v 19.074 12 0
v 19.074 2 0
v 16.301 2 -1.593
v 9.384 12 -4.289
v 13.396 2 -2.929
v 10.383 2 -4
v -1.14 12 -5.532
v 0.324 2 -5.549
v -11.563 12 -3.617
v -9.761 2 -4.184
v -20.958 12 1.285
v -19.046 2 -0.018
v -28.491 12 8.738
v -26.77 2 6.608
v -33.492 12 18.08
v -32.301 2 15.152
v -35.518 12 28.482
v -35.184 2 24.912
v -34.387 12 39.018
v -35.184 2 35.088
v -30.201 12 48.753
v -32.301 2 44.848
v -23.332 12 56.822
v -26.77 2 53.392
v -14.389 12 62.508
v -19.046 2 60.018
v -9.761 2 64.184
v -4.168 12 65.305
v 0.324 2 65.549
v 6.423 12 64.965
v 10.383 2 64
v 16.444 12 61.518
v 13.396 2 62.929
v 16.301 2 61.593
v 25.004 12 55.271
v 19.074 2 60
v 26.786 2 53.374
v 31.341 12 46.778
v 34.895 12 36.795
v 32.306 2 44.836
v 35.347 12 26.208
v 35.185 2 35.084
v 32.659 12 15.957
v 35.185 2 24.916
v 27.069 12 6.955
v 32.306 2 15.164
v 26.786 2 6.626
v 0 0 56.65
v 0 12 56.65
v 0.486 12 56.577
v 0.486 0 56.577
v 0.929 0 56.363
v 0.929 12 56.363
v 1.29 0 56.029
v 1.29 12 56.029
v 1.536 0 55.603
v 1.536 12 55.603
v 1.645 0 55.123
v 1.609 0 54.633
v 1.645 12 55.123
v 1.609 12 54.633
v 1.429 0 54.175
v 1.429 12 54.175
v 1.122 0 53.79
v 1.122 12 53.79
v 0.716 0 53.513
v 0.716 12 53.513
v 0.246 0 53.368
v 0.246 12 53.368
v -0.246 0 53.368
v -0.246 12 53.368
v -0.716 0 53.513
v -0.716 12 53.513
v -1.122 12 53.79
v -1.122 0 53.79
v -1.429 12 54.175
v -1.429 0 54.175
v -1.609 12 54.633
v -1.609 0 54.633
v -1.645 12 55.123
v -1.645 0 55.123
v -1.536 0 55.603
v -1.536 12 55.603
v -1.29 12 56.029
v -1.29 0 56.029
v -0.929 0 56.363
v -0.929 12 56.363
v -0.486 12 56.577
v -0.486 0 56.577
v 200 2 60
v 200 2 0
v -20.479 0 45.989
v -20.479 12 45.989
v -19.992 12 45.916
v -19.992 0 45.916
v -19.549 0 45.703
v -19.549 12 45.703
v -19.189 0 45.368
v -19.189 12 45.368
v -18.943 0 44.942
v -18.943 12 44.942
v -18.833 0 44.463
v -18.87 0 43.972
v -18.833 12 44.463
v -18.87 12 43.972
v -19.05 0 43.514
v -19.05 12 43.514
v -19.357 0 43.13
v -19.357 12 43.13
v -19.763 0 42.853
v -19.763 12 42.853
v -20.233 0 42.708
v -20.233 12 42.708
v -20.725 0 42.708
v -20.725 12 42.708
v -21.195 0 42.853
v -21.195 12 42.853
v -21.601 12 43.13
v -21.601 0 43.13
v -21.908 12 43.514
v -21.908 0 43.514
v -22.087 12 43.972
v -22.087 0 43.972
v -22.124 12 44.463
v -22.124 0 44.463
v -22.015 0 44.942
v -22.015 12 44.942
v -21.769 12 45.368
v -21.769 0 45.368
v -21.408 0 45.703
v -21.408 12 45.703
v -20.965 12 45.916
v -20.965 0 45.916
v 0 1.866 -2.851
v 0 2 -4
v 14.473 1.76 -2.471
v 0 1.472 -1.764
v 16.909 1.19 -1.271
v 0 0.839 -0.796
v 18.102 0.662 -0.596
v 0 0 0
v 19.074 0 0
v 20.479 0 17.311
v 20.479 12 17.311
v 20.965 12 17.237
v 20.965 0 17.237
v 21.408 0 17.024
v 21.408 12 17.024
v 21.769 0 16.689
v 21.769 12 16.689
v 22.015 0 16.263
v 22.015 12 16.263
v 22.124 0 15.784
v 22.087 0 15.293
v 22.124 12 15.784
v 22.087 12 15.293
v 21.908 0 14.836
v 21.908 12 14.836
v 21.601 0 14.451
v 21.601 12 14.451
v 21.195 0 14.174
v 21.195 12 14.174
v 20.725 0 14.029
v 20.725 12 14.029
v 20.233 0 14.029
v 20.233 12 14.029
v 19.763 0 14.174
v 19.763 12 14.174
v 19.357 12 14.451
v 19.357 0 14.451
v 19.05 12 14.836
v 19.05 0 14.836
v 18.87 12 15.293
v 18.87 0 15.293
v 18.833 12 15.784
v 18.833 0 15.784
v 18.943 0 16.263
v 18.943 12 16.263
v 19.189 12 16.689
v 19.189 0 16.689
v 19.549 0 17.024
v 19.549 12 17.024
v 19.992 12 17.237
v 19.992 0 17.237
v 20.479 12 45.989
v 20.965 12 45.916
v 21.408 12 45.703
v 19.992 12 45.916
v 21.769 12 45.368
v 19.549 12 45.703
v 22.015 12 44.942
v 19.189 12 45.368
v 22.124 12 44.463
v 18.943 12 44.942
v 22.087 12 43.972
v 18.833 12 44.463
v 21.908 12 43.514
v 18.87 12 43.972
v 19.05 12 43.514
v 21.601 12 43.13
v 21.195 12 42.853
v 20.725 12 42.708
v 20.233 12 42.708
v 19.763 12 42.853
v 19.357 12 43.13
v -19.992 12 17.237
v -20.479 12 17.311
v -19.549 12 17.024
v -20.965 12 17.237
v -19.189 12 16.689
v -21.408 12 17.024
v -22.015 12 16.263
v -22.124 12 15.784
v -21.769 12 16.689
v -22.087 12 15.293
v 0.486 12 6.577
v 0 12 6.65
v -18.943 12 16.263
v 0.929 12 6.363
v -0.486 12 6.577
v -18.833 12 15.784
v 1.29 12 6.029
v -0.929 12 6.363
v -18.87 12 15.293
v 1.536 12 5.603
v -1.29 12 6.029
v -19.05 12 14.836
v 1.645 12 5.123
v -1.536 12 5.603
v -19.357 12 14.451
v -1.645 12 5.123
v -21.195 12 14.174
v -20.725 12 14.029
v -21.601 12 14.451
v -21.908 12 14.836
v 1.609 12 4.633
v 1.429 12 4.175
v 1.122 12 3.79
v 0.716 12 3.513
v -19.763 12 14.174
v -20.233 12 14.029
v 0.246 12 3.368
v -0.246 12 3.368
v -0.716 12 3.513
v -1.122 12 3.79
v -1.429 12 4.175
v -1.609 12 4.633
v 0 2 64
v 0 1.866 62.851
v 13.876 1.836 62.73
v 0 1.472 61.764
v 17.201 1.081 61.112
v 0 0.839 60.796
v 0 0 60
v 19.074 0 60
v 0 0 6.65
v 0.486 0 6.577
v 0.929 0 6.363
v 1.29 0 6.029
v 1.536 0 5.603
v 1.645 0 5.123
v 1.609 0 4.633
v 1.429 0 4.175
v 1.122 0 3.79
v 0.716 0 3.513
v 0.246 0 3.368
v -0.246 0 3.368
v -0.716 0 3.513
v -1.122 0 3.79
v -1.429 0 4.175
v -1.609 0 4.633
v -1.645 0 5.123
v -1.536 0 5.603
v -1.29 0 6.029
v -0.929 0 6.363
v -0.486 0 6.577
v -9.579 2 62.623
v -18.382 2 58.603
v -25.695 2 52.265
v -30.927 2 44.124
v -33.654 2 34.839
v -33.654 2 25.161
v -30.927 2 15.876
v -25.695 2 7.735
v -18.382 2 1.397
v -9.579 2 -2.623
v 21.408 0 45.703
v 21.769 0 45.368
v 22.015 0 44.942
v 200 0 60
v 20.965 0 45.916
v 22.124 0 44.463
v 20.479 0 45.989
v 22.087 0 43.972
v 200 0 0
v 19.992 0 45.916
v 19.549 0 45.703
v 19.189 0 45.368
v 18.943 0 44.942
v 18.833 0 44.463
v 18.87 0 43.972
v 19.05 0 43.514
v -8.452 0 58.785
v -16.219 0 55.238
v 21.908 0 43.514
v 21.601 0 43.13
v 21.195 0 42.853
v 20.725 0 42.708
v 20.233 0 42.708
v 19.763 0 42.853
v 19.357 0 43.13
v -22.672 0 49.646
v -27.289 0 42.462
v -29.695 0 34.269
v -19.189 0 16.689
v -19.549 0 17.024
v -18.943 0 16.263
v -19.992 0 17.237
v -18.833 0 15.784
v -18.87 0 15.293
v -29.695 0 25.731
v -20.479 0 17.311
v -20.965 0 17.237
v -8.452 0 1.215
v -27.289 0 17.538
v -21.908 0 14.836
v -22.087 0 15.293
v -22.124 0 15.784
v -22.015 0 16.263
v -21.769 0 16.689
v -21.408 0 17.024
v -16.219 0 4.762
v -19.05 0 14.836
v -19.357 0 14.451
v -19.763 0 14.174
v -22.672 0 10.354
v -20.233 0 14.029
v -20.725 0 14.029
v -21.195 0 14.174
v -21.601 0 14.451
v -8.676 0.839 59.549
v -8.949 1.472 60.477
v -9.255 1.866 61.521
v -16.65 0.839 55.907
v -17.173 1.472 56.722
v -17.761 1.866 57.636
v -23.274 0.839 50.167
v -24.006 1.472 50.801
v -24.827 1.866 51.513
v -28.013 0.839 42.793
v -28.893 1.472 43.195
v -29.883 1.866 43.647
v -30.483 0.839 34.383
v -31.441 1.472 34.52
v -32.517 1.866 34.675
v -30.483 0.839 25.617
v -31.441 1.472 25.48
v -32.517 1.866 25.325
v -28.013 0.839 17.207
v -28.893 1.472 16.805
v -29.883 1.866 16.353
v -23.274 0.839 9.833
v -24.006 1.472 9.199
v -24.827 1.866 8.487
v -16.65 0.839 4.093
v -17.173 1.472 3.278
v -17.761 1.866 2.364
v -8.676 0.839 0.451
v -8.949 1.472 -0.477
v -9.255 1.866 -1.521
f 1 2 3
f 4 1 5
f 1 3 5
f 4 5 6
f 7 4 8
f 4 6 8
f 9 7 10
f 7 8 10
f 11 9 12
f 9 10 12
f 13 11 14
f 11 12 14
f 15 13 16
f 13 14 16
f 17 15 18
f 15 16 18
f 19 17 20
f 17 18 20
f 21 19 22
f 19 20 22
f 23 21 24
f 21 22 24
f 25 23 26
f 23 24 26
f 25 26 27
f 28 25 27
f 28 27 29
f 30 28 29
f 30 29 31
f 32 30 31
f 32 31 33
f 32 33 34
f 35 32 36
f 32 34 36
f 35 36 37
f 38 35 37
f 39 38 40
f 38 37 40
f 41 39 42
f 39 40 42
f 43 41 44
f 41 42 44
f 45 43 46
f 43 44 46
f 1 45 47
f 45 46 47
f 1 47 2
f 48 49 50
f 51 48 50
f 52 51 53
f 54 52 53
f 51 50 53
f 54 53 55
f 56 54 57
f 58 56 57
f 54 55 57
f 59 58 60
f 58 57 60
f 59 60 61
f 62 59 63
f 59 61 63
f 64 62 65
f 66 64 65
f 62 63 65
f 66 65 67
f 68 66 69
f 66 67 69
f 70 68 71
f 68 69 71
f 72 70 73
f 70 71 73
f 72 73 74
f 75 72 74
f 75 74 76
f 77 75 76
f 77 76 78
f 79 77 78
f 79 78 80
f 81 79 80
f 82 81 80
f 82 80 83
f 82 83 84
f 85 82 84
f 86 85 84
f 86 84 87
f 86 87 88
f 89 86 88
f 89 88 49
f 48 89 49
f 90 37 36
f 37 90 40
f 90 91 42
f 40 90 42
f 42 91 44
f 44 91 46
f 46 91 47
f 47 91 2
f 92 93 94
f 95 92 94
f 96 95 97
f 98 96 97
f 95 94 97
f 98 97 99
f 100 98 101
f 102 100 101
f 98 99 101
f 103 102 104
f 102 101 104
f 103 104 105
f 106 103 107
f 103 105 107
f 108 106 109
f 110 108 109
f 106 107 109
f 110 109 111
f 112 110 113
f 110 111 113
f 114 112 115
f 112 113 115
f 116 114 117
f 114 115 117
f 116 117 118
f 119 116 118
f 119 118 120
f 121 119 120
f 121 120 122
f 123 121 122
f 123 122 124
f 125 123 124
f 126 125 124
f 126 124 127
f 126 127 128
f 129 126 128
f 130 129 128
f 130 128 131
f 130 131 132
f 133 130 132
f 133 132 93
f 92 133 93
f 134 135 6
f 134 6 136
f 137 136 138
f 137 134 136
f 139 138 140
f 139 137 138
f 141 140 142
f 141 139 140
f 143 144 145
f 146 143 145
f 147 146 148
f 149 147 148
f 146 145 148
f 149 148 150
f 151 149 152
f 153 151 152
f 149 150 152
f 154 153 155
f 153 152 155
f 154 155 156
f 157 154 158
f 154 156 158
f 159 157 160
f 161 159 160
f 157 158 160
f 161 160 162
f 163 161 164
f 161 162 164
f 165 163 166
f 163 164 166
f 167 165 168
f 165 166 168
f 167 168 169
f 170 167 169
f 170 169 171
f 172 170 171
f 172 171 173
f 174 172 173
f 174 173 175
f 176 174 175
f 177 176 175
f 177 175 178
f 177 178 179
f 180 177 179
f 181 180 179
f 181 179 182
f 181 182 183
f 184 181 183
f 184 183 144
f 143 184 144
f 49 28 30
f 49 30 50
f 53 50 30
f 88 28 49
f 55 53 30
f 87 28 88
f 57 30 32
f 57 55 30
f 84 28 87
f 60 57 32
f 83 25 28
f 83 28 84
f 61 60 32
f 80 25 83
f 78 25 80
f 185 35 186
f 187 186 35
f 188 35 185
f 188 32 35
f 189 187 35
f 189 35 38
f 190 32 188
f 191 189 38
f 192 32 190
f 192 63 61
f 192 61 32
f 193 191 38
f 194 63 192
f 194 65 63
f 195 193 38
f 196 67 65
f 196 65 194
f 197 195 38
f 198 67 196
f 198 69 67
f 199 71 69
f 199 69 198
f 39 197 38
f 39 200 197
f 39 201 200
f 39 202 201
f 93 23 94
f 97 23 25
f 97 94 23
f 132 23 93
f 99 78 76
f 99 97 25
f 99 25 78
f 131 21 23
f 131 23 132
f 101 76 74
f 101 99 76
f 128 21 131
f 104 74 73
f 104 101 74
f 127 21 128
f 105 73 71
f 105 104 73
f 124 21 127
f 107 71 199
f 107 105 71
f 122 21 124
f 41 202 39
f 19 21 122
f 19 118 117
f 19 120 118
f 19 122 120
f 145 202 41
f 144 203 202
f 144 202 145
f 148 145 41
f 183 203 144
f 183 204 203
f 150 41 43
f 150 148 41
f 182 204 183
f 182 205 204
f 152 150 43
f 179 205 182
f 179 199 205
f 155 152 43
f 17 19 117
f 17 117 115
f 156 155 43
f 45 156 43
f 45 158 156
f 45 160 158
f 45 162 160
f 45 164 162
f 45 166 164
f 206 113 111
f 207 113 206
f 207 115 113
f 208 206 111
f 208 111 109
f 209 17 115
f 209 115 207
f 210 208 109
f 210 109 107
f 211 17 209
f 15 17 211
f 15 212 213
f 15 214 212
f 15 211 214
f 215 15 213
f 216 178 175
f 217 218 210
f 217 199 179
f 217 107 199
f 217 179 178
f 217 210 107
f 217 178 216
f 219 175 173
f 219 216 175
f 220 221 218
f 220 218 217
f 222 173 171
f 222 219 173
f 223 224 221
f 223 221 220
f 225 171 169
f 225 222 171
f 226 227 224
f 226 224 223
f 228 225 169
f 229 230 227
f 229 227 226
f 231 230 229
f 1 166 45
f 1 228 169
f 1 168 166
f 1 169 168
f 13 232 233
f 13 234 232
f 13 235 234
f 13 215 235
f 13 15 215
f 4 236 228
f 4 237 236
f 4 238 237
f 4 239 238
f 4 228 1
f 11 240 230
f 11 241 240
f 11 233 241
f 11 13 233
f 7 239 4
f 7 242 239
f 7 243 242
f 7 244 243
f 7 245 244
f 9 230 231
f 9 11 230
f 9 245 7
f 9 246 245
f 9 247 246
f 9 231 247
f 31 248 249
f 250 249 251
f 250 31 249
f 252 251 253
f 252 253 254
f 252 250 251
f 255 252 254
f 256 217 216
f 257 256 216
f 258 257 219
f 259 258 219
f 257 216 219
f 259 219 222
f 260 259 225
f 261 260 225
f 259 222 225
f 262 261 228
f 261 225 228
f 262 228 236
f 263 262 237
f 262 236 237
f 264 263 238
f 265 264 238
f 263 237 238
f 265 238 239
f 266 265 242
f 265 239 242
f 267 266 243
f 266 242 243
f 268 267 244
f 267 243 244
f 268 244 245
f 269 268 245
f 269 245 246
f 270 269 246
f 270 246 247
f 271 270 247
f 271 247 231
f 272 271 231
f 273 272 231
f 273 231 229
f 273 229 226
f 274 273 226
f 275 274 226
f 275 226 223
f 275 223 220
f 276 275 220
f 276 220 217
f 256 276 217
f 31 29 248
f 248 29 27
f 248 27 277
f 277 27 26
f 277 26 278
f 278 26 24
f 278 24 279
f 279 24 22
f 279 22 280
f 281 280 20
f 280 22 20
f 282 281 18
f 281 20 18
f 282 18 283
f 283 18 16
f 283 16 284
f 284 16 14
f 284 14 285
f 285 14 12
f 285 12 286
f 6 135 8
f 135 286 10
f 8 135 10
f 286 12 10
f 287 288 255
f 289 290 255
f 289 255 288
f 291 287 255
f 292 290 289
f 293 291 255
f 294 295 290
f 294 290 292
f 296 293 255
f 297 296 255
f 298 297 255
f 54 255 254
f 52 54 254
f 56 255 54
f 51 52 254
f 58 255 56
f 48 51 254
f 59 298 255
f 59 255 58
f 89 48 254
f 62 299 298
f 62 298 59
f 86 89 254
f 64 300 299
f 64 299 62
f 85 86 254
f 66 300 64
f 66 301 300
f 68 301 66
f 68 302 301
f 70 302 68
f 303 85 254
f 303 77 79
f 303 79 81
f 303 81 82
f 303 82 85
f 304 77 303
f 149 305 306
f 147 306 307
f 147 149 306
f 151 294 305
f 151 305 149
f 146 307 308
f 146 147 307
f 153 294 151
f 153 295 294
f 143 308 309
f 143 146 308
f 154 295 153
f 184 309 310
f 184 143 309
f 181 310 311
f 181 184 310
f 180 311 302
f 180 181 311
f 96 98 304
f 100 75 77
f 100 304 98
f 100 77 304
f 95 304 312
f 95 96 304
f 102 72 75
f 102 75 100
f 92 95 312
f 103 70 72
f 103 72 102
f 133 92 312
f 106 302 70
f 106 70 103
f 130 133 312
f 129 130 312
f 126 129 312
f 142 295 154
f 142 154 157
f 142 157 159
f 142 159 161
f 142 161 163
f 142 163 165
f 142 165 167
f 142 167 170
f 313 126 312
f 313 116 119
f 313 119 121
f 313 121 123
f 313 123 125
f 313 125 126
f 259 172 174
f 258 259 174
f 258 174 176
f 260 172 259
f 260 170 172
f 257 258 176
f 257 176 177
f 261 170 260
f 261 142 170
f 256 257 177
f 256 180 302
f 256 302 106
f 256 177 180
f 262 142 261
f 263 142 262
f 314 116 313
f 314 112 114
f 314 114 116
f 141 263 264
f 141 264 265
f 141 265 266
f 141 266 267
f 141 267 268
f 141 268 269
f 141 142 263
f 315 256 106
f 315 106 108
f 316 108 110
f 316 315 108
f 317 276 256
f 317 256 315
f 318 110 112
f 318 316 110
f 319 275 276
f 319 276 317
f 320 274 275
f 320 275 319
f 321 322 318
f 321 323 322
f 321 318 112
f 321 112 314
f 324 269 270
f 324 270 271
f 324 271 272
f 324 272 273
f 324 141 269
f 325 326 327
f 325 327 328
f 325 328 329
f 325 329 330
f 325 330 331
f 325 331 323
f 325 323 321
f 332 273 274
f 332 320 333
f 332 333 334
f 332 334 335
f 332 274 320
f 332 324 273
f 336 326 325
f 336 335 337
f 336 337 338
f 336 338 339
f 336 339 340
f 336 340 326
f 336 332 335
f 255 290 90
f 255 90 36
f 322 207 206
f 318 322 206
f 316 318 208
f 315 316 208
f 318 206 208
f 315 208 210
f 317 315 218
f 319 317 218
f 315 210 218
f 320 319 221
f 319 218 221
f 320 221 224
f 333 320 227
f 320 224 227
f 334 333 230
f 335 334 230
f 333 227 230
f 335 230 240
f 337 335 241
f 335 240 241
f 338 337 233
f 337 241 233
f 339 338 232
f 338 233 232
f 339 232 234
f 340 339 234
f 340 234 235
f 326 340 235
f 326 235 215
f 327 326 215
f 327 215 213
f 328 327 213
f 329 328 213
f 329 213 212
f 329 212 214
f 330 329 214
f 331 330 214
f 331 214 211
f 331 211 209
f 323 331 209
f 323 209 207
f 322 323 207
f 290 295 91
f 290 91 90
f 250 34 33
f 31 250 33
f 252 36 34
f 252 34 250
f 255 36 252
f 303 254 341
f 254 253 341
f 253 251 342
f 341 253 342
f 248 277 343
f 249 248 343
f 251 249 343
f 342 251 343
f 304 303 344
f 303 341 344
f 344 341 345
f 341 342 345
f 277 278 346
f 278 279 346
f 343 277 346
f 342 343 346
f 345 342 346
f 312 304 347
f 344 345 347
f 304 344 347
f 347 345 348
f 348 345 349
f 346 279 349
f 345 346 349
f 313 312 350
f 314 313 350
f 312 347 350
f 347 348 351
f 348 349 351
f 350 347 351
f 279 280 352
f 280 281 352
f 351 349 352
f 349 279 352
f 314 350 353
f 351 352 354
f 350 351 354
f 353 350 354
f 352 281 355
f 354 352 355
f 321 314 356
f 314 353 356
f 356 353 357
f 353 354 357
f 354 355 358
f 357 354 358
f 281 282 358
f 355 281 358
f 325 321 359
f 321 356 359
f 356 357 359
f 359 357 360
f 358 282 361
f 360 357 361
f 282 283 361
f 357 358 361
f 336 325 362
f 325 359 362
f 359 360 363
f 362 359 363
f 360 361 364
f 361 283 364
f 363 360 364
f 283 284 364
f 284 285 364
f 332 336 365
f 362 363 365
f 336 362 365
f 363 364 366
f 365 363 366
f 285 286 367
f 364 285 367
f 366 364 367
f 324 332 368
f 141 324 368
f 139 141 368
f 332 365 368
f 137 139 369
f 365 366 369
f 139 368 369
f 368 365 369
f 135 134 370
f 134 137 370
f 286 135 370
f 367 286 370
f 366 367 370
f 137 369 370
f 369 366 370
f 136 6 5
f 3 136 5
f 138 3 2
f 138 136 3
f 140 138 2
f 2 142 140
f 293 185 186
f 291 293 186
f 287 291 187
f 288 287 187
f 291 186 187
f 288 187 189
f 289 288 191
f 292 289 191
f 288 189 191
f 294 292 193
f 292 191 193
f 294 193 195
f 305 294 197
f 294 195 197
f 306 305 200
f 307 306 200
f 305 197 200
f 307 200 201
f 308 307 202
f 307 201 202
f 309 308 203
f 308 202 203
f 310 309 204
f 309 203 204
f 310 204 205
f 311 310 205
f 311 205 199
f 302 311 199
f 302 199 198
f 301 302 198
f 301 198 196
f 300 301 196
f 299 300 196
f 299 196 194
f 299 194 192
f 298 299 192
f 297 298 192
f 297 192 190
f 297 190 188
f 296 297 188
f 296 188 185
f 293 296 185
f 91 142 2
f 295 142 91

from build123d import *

# Parameters (mm, degrees)
BOSS_EXTRUDE1_DEPTH = 2
SKETCH3_R           = 35.55
BOSS_EXTRUDE2_DEPTH = 10
FILLET1_R           = 5
SKETCH4_R           = 1.65
CUT_EXTRUDE1_DEPTH  = 19


with BuildPart() as part:
    # Sketch2 → Boss-Extrude1 (new body)
    with BuildSketch(Plane(origin=(0, 0, 0), x_dir=(1, 0, 0), z_dir=(0, 1, 0))):
        with BuildLine():
            Line((0, 0), (200, 0))
            Line((200, 0), (200, -60))
            Line((200, -60), (0, -60))
            ThreePointArc((0, -60), (-30, -30), (0, 0))
        make_face()
    extrude(amount=BOSS_EXTRUDE1_DEPTH)

    # Sketch3 → Boss-Extrude2 (add)
    with BuildSketch(Plane(origin=(0, 2, 0), x_dir=(1, 0, 0), z_dir=(0, 1, 0))):
        with Locations(Location((0, -30, 0), (0, 0, 57.552333234))):
            Circle(SKETCH3_R)
    extrude(amount=BOSS_EXTRUDE2_DEPTH)

    # Fillet1
    # the kernel refuses this fillet: 5 mm, written as the material it adds along each edge
    with BuildSketch(Plane(origin=(0, 2, 0), x_dir=(0, -1, 0), z_dir=(1, 0, 0))) as fillet1_piece_1_section:
        with BuildLine():
            CenterArc((5, 4), FILLET1_R, 180, 53.130102354)
            Line((0, 4), (0, 0))
            Line((0, 0), (2, 0))
        make_face()
    fillet1_piece_1 = extrude(amount=29.07360742, mode=Mode.PRIVATE)
    fillet1_piece_1 = fillet1_piece_1 & Plane(origin=(0, 2, 30), x_dir=(0.5365290413395907, 0, -0.8438818565410799), z_dir=(0, -1, 0)) * Cylinder(35.55, 75, mode=Mode.PRIVATE)
    add(fillet1_piece_1)
    with BuildSketch(Plane(origin=(29.07360742, 2, 60), x_dir=(0, 0, 1), z_dir=(-1, 0, 0))) as fillet1_piece_2_section:
        with BuildLine():
            CenterArc((4, -5), FILLET1_R, 90, 53.130102354)
            Line((0, -2), (0, 0))
            Line((0, 0), (4, 0))
        make_face()
    fillet1_piece_2 = extrude(amount=29.07360742, mode=Mode.PRIVATE)
    fillet1_piece_2 = fillet1_piece_2 & Plane(origin=(0, 2, 30), x_dir=(0.5365290413395907, 0, -0.8438818565410799), z_dir=(0, -1, 0)) * Cylinder(35.55, 75, mode=Mode.PRIVATE)
    add(fillet1_piece_2)
    with BuildSketch(Plane(origin=(0, 2, 30), x_dir=(0, 0, 1), z_dir=(1, 0, 0))) as fillet1_piece_3:
        with BuildLine():
            CenterArc((34, 5), FILLET1_R, 216.869897646, 53.130102354)
            Line((34, 0), (30, 0))
            Line((30, 0), (30, 2))
        make_face()
    revolve(axis=Axis((0, 2, 30), (0, -1, 0)), revolution_arc=180)

    # Sketch4 → Cut-Extrude1 (cut)
    with BuildSketch(Plane(origin=(0, 12, 0), x_dir=(1, 0, 0), z_dir=(0, 1, 0))):
        with Locations(Location((0, -5, 0), (0, 0, 270))):
            Circle(SKETCH4_R)
        with Locations(Location((0, -55, 0), (0, 0, 270))):
            Circle(SKETCH4_R)
        with Locations(Location((-20.478801107, -15.660589091, 0), (0, 0, 270))):
            Circle(SKETCH4_R)
        with Locations(Location((-20.478801107, -44.339410909, 0), (0, 0, 270))):
            Circle(SKETCH4_R)
        with Locations(Location((20.478801107, -15.660589091, 0), (0, 0, 270))):
            Circle(SKETCH4_R)
        with Locations(Location((20.478801107, -44.339410909, 0), (0, 0, 270))):
            Circle(SKETCH4_R)
    extrude(amount=-CUT_EXTRUDE1_DEPTH, mode=Mode.SUBTRACT)


solid = part.part
